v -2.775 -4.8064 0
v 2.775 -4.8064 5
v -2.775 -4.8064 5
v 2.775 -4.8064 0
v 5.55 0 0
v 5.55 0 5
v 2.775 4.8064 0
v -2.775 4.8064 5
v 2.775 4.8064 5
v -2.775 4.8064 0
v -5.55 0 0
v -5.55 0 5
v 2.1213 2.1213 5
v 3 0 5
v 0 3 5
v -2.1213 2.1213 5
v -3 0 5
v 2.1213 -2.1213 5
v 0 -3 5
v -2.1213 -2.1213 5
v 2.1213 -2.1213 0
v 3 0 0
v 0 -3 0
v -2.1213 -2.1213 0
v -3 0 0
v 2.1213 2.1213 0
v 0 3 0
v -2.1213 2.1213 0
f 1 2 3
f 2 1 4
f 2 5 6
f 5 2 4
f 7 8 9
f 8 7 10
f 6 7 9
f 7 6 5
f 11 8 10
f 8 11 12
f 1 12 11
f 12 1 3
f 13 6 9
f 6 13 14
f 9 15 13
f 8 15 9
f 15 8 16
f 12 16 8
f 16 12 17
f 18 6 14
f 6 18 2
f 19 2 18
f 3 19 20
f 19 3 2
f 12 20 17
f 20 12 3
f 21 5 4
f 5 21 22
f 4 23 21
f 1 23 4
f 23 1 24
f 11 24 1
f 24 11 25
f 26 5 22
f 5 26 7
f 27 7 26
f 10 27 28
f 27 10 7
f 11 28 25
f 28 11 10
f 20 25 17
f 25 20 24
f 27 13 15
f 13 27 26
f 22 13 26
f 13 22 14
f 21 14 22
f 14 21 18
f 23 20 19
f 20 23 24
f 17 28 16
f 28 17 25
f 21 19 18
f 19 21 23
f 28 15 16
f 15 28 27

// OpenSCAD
// file: ../../lib/scad/nuts.scad
//Muts
include <../../settings/scad/global.scad>

fnl = fn; //fn local

//Mx = [rInt, rExt, height]
M3 = [1.5, 3, 2.2];
M4 = [2, 3.85, 3];
M5 = [2.5, 4.4, 4.5];
M6 = [3, 5.55, 5];
M8 = [4, 7.2, 6.44];
//M = [,,];


module nut_Mx(rInt=4,rExt=7.2,height=6.44){
		difference(){
			cylinder(height,rExt,rExt, $fn=6);
			translate([0,0,-1])
			cylinder(height+2,rInt,rInt, $fn=4*2*fnl);
		}
}

module nut_M3(){
	nut_Mx(M3[0], M3[1], M3[2]);
}
module nut_M4(){
	nut_Mx(M4[0], M4[1], M4[2]);
}
module nut_M5(){
	nut_Mx(M5[0], M5[1], M5[2]);
}
module nut_M6(){
	nut_Mx(M6[0], M6[1], M6[2]);
}
module nut_M8(){
	nut_Mx(M8[0], M8[1], M8[2]);
}

nut_M6();

module nut_M8_x(posX=0,posY=0,posZ=0){
	translate([posX,posY,posZ])
		rotate([0,90,0])
			color("grey")
				nut_M8();
}

module nut_M8_y(posX=0,posY=0,posZ=0){
	translate([posX,posY,posZ])
		rotate([-90,0,0])
			color("lightgrey")
				nut_M8();
}
module nut_M8_z(posX=0,posY=0,posZ=0){
	translate([posX,posY,posZ])
		rotate([0,0,90])
			color("darkgrey")
				nut_M8();
}
// file: ../../lib/scad/threadedBars.scad
//Threaded Bars
include <../../settings/scad/global.scad>

fnl = fn; //fn local

module threadedBar_M8_x(posX=0,posY=0,posZ=0, length=400){
	translate([posX,posY,posZ])
		rotate([0,90,0])
			color("grey")
				cylinder(length,4,4, $fn=8*fnl);
}

module threadedBar_M8_y(posX=0,posY=0,posZ=0, length=400){
	translate([posX,posY,posZ])
		rotate([-90,0,0])
			color("lightgrey")
				cylinder(length,4,4, $fn=8*fnl);
}
module threadedBar_M8_z(posX=0,posY=0,posZ=0, length=400){
	translate([posX,posY,posZ])
		rotate([0,0,90])
			color("darkgrey")
				cylinder(length,4,4, $fn=8*fnl);
}
// file: connector_m8.scad
include <../../settings/scad/global.scad>

include <../../lib/scad/threadedBars.scad>
include <../../lib/scad/nuts.scad>

fnl = 4*fn; //fn local
correction=1;
MX = 8;

M = MX-correction; //use M8 threaded bars
length=50;
lengthCorrected = length - 2*correction;
M_2 = M/2;
MX_2 = MX/2;

//threadedBar_M8_x(posXi=-10);
//nut_M8_x(posXi=-8);


module holderThrBar(posXi=0, posYi=0, posZi=0, rotXi=0, rotYi=0, rotZi=0, clri="red", Mx=8){
	translate([posXi, posYi, posZi])
		rotate([rotXi, rotYi, rotZi])
			color(clri)
				difference(){
					cylinder (length,Mx,Mx, $fn=Mx*fnl);
						translate([0,0,-1])
						cylinder (length+2,Mx/2+0.2,Mx/2+0.2, $fn=Mx/2*fnl);
				}//diff
} //holderThrBar

module holderThrBarX2(posXi=0, posYi=0, posZi=0, rotXi=0, rotYi=0, rotZi=0, clri="red", Mx=8){
	translate([posXi, posYi, posZi])
		rotate([rotXi, rotYi, rotZi])
			color(clri)
				difference(){
					cylinder (length*2,Mx,Mx, $fn=Mx*fnl);
						translate([0,0,-1])
						cylinder (length*2+2,Mx/2+0.2,Mx/2+0.2, $fn=Mx/2*fnl);
				}//diff
} //holderThrBar

module holderShaftBar(posXi=0, posYi=0, posZi=0, rotXi=0, rotYi=0, rotZi=0, clri="green", Mx=8){
	translate([posXi, posYi, posZi])
		rotate([rotXi, rotYi, rotZi])
			color(clri)
				difference(){
					cylinder (length,Mx,Mx, $fn=Mx*fnl);
						translate([0,0,length/2-1])
						cylinder (length/2+2,Mx/2+0.2,Mx/2+0.2, $fn=Mx/2*fnl);
				}//diff
} //holderShaftBar


module connector_M8(posX=0, posY=0, posZ=0, rotX=0, rotY=0, rotZ=0, clr="red"){
	translate([posX, posY, posZ])
		rotate([rotX, rotY, rotZ])
			color(clr){
				holderThrBar(rotYi=90, clri=clr);
				holderThrBar(posYi=length-M*2-correction*2, rotYi=90, clri=clr);
				holderThrBar(posYi=(length-M*2-correction*2)/2, posZi=M*4, rotYi=90, clri=clr);

				holderThrBar(posXi=length/2, posYi=-M-correction, posZi=M*6, rotYi=90, rotZi=90, clri=clr);
				holderThrBar(posXi=M+correction, posYi=-M-correction, posZi=M*2, rotYi=90, rotZi=90, clri=clr);
				holderThrBar(posXi=length-M-correction, posYi=-M-correction, posZi=M*2, rotYi=90, rotZi=90, clri=clr);
			}//transform
}//connector


module connector_M8_shaftY(posX=0, posY=0, posZ=0, rotX=0, rotY=0, rotZ=0, clr="green"){
	translate([posX, posY, posZ])
		rotate([rotX, rotY, rotZ])
			color(clr){
				holderThrBarX2(rotYi=90, clri=clr);
				holderThrBarX2(posYi=length-M*2-correction*2, rotYi=90, clri=clr);
				holderThrBarX2(posYi=(length-M*2-correction*2)/2, posZi=M*4, rotYi=90, clri=clr);

				
				holderShaftBar(posXi=M+correction, posYi=-M-correction, posZi=M*2, rotYi=90, rotZi=90, clri=clr);
				holderShaftBar(posXi=length*2-M-correction, posYi=-M-correction, posZi=M*2, rotYi=90, rotZi=90, clri=clr);
			}//transform
}//connector
//holderShaftBar();

//support
/*
translate([0,MX_2+0.2,-MX])
	cube([length,length-MX*3-0.2*2,MX*2]);

translate([M,-MX,M])
	cube([length-MX*3-0.2*2,length,MX*2]);
*/
/*
translate([0,-M,-M])
	difference(){
		minkowski(){
			cube([lengthCorrected,lengthCorrected,lengthCorrected]);
			sphere(M/2, $fn = 4*4*fnl);
		}//minkowski
		translate([0,0,-M_2])
			cube([lengthCorrected,lengthCorrected,lengthCorrected+M]);
		translate([0,-M_2,0])
			cube([lengthCorrected,lengthCorrected+M,lengthCorrected]);
		translate([-M_2,0,0])
			cube([lengthCorrected+M,lengthCorrected,lengthCorrected]);
}
*/
// file: ../../settings/scad/global.scad
fn = 1;

shaftX_posZ = 100;

shaftY_posX = 100;

shaftZ_posY = 150;

lnBase = 300;			//lengthBase
lnConnect = 50;		//lengthConnect
lnNuts = 10;			//lengthNuts
lnNutsShift = 2;		//M8 Nut ~ 6 mm, so +2 mm from both side will give a lnNuts 10mm value 

Mx = 8;
correction=1;
M = Mx-correction; //use M8 threaded bars
M_2 = M/2;
Mx_2 = Mx/2;
// main file
include <../../settings/scad/global.scad>

include <../../prn_200x200x200/scad/connector_m8.scad>
include <../../lib/scad/threadedBars.scad>
include <../../lib/scad/nuts.scad>


module threadedBarX(){
	threadedBar_M8_x(posX=-lnConnect-lnNuts, length=lnBase+2*(lnConnect+lnNuts));
	nut_M8_x(posX=-lnConnect-lnNuts+lnNutsShift);
	nut_M8_x(posX=0+lnNutsShift);
	nut_M8_x(posX=lnBase-lnNuts+lnNutsShift);
	nut_M8_x(posX=lnBase+lnConnect+lnNutsShift);
}

module threadedBarY(){
	threadedBar_M8_y(posY=-lnConnect-lnNuts, length=lnBase+2*(lnConnect+lnNuts));
	nut_M8_y(posY=-lnConnect-lnNuts+lnNutsShift);
	nut_M8_y(posY=0+lnNutsShift);
	nut_M8_y(posY=lnBase-lnNuts+lnNutsShift);
	nut_M8_y(posY=lnBase+lnConnect+lnNutsShift);
}

module basement() {
//front X
translate([0,-lnConnect+lnNuts-lnNutsShift,0]){
	connector_M8(posX=-lnConnect, clr="grey");
	connector_M8(posX=lnBase, clr="grey");
	translate([0,0,0]);
		threadedBarX();
	translate([0,lnConnect-Mx*2,0])
		threadedBarX();
	translate([0,(lnConnect-Mx*2)/2,(Mx-1)*4])
		threadedBarX();
}//translate

//back X
translate([0,lnNuts-lnNutsShift,0]){
	connector_M8(posX=-lnConnect, posY=lnBase, clr="grey");
	connector_M8(posX=lnBase, posY=lnBase, clr="grey");
	translate([0,lnBase,0])
		threadedBarX();
	translate([0,lnBase+lnConnect-Mx*2,0])
		threadedBarX();
	translate([0,lnBase+(lnConnect-Mx*2)/2,(Mx-1)*4])
		threadedBarX();
}//translate

// Y bars left
translate([-Mx,0, Mx*2-2])
	threadedBarY();	
translate([-lnConnect+Mx,0, Mx*2-2])
	threadedBarY();	
translate([(-lnConnect)/2,0, Mx*2-2+(Mx-1)*4])
	threadedBarY();	

// Y bars right
translate([lnBase+lnConnect-Mx,0, Mx*2-2])
	threadedBarY();	
translate([lnBase+Mx,0, Mx*2-2])
	threadedBarY();	
translate([lnBase+(lnConnect)/2,0, Mx*2-2+(Mx-1)*4])
	threadedBarY();
}//end of basement
